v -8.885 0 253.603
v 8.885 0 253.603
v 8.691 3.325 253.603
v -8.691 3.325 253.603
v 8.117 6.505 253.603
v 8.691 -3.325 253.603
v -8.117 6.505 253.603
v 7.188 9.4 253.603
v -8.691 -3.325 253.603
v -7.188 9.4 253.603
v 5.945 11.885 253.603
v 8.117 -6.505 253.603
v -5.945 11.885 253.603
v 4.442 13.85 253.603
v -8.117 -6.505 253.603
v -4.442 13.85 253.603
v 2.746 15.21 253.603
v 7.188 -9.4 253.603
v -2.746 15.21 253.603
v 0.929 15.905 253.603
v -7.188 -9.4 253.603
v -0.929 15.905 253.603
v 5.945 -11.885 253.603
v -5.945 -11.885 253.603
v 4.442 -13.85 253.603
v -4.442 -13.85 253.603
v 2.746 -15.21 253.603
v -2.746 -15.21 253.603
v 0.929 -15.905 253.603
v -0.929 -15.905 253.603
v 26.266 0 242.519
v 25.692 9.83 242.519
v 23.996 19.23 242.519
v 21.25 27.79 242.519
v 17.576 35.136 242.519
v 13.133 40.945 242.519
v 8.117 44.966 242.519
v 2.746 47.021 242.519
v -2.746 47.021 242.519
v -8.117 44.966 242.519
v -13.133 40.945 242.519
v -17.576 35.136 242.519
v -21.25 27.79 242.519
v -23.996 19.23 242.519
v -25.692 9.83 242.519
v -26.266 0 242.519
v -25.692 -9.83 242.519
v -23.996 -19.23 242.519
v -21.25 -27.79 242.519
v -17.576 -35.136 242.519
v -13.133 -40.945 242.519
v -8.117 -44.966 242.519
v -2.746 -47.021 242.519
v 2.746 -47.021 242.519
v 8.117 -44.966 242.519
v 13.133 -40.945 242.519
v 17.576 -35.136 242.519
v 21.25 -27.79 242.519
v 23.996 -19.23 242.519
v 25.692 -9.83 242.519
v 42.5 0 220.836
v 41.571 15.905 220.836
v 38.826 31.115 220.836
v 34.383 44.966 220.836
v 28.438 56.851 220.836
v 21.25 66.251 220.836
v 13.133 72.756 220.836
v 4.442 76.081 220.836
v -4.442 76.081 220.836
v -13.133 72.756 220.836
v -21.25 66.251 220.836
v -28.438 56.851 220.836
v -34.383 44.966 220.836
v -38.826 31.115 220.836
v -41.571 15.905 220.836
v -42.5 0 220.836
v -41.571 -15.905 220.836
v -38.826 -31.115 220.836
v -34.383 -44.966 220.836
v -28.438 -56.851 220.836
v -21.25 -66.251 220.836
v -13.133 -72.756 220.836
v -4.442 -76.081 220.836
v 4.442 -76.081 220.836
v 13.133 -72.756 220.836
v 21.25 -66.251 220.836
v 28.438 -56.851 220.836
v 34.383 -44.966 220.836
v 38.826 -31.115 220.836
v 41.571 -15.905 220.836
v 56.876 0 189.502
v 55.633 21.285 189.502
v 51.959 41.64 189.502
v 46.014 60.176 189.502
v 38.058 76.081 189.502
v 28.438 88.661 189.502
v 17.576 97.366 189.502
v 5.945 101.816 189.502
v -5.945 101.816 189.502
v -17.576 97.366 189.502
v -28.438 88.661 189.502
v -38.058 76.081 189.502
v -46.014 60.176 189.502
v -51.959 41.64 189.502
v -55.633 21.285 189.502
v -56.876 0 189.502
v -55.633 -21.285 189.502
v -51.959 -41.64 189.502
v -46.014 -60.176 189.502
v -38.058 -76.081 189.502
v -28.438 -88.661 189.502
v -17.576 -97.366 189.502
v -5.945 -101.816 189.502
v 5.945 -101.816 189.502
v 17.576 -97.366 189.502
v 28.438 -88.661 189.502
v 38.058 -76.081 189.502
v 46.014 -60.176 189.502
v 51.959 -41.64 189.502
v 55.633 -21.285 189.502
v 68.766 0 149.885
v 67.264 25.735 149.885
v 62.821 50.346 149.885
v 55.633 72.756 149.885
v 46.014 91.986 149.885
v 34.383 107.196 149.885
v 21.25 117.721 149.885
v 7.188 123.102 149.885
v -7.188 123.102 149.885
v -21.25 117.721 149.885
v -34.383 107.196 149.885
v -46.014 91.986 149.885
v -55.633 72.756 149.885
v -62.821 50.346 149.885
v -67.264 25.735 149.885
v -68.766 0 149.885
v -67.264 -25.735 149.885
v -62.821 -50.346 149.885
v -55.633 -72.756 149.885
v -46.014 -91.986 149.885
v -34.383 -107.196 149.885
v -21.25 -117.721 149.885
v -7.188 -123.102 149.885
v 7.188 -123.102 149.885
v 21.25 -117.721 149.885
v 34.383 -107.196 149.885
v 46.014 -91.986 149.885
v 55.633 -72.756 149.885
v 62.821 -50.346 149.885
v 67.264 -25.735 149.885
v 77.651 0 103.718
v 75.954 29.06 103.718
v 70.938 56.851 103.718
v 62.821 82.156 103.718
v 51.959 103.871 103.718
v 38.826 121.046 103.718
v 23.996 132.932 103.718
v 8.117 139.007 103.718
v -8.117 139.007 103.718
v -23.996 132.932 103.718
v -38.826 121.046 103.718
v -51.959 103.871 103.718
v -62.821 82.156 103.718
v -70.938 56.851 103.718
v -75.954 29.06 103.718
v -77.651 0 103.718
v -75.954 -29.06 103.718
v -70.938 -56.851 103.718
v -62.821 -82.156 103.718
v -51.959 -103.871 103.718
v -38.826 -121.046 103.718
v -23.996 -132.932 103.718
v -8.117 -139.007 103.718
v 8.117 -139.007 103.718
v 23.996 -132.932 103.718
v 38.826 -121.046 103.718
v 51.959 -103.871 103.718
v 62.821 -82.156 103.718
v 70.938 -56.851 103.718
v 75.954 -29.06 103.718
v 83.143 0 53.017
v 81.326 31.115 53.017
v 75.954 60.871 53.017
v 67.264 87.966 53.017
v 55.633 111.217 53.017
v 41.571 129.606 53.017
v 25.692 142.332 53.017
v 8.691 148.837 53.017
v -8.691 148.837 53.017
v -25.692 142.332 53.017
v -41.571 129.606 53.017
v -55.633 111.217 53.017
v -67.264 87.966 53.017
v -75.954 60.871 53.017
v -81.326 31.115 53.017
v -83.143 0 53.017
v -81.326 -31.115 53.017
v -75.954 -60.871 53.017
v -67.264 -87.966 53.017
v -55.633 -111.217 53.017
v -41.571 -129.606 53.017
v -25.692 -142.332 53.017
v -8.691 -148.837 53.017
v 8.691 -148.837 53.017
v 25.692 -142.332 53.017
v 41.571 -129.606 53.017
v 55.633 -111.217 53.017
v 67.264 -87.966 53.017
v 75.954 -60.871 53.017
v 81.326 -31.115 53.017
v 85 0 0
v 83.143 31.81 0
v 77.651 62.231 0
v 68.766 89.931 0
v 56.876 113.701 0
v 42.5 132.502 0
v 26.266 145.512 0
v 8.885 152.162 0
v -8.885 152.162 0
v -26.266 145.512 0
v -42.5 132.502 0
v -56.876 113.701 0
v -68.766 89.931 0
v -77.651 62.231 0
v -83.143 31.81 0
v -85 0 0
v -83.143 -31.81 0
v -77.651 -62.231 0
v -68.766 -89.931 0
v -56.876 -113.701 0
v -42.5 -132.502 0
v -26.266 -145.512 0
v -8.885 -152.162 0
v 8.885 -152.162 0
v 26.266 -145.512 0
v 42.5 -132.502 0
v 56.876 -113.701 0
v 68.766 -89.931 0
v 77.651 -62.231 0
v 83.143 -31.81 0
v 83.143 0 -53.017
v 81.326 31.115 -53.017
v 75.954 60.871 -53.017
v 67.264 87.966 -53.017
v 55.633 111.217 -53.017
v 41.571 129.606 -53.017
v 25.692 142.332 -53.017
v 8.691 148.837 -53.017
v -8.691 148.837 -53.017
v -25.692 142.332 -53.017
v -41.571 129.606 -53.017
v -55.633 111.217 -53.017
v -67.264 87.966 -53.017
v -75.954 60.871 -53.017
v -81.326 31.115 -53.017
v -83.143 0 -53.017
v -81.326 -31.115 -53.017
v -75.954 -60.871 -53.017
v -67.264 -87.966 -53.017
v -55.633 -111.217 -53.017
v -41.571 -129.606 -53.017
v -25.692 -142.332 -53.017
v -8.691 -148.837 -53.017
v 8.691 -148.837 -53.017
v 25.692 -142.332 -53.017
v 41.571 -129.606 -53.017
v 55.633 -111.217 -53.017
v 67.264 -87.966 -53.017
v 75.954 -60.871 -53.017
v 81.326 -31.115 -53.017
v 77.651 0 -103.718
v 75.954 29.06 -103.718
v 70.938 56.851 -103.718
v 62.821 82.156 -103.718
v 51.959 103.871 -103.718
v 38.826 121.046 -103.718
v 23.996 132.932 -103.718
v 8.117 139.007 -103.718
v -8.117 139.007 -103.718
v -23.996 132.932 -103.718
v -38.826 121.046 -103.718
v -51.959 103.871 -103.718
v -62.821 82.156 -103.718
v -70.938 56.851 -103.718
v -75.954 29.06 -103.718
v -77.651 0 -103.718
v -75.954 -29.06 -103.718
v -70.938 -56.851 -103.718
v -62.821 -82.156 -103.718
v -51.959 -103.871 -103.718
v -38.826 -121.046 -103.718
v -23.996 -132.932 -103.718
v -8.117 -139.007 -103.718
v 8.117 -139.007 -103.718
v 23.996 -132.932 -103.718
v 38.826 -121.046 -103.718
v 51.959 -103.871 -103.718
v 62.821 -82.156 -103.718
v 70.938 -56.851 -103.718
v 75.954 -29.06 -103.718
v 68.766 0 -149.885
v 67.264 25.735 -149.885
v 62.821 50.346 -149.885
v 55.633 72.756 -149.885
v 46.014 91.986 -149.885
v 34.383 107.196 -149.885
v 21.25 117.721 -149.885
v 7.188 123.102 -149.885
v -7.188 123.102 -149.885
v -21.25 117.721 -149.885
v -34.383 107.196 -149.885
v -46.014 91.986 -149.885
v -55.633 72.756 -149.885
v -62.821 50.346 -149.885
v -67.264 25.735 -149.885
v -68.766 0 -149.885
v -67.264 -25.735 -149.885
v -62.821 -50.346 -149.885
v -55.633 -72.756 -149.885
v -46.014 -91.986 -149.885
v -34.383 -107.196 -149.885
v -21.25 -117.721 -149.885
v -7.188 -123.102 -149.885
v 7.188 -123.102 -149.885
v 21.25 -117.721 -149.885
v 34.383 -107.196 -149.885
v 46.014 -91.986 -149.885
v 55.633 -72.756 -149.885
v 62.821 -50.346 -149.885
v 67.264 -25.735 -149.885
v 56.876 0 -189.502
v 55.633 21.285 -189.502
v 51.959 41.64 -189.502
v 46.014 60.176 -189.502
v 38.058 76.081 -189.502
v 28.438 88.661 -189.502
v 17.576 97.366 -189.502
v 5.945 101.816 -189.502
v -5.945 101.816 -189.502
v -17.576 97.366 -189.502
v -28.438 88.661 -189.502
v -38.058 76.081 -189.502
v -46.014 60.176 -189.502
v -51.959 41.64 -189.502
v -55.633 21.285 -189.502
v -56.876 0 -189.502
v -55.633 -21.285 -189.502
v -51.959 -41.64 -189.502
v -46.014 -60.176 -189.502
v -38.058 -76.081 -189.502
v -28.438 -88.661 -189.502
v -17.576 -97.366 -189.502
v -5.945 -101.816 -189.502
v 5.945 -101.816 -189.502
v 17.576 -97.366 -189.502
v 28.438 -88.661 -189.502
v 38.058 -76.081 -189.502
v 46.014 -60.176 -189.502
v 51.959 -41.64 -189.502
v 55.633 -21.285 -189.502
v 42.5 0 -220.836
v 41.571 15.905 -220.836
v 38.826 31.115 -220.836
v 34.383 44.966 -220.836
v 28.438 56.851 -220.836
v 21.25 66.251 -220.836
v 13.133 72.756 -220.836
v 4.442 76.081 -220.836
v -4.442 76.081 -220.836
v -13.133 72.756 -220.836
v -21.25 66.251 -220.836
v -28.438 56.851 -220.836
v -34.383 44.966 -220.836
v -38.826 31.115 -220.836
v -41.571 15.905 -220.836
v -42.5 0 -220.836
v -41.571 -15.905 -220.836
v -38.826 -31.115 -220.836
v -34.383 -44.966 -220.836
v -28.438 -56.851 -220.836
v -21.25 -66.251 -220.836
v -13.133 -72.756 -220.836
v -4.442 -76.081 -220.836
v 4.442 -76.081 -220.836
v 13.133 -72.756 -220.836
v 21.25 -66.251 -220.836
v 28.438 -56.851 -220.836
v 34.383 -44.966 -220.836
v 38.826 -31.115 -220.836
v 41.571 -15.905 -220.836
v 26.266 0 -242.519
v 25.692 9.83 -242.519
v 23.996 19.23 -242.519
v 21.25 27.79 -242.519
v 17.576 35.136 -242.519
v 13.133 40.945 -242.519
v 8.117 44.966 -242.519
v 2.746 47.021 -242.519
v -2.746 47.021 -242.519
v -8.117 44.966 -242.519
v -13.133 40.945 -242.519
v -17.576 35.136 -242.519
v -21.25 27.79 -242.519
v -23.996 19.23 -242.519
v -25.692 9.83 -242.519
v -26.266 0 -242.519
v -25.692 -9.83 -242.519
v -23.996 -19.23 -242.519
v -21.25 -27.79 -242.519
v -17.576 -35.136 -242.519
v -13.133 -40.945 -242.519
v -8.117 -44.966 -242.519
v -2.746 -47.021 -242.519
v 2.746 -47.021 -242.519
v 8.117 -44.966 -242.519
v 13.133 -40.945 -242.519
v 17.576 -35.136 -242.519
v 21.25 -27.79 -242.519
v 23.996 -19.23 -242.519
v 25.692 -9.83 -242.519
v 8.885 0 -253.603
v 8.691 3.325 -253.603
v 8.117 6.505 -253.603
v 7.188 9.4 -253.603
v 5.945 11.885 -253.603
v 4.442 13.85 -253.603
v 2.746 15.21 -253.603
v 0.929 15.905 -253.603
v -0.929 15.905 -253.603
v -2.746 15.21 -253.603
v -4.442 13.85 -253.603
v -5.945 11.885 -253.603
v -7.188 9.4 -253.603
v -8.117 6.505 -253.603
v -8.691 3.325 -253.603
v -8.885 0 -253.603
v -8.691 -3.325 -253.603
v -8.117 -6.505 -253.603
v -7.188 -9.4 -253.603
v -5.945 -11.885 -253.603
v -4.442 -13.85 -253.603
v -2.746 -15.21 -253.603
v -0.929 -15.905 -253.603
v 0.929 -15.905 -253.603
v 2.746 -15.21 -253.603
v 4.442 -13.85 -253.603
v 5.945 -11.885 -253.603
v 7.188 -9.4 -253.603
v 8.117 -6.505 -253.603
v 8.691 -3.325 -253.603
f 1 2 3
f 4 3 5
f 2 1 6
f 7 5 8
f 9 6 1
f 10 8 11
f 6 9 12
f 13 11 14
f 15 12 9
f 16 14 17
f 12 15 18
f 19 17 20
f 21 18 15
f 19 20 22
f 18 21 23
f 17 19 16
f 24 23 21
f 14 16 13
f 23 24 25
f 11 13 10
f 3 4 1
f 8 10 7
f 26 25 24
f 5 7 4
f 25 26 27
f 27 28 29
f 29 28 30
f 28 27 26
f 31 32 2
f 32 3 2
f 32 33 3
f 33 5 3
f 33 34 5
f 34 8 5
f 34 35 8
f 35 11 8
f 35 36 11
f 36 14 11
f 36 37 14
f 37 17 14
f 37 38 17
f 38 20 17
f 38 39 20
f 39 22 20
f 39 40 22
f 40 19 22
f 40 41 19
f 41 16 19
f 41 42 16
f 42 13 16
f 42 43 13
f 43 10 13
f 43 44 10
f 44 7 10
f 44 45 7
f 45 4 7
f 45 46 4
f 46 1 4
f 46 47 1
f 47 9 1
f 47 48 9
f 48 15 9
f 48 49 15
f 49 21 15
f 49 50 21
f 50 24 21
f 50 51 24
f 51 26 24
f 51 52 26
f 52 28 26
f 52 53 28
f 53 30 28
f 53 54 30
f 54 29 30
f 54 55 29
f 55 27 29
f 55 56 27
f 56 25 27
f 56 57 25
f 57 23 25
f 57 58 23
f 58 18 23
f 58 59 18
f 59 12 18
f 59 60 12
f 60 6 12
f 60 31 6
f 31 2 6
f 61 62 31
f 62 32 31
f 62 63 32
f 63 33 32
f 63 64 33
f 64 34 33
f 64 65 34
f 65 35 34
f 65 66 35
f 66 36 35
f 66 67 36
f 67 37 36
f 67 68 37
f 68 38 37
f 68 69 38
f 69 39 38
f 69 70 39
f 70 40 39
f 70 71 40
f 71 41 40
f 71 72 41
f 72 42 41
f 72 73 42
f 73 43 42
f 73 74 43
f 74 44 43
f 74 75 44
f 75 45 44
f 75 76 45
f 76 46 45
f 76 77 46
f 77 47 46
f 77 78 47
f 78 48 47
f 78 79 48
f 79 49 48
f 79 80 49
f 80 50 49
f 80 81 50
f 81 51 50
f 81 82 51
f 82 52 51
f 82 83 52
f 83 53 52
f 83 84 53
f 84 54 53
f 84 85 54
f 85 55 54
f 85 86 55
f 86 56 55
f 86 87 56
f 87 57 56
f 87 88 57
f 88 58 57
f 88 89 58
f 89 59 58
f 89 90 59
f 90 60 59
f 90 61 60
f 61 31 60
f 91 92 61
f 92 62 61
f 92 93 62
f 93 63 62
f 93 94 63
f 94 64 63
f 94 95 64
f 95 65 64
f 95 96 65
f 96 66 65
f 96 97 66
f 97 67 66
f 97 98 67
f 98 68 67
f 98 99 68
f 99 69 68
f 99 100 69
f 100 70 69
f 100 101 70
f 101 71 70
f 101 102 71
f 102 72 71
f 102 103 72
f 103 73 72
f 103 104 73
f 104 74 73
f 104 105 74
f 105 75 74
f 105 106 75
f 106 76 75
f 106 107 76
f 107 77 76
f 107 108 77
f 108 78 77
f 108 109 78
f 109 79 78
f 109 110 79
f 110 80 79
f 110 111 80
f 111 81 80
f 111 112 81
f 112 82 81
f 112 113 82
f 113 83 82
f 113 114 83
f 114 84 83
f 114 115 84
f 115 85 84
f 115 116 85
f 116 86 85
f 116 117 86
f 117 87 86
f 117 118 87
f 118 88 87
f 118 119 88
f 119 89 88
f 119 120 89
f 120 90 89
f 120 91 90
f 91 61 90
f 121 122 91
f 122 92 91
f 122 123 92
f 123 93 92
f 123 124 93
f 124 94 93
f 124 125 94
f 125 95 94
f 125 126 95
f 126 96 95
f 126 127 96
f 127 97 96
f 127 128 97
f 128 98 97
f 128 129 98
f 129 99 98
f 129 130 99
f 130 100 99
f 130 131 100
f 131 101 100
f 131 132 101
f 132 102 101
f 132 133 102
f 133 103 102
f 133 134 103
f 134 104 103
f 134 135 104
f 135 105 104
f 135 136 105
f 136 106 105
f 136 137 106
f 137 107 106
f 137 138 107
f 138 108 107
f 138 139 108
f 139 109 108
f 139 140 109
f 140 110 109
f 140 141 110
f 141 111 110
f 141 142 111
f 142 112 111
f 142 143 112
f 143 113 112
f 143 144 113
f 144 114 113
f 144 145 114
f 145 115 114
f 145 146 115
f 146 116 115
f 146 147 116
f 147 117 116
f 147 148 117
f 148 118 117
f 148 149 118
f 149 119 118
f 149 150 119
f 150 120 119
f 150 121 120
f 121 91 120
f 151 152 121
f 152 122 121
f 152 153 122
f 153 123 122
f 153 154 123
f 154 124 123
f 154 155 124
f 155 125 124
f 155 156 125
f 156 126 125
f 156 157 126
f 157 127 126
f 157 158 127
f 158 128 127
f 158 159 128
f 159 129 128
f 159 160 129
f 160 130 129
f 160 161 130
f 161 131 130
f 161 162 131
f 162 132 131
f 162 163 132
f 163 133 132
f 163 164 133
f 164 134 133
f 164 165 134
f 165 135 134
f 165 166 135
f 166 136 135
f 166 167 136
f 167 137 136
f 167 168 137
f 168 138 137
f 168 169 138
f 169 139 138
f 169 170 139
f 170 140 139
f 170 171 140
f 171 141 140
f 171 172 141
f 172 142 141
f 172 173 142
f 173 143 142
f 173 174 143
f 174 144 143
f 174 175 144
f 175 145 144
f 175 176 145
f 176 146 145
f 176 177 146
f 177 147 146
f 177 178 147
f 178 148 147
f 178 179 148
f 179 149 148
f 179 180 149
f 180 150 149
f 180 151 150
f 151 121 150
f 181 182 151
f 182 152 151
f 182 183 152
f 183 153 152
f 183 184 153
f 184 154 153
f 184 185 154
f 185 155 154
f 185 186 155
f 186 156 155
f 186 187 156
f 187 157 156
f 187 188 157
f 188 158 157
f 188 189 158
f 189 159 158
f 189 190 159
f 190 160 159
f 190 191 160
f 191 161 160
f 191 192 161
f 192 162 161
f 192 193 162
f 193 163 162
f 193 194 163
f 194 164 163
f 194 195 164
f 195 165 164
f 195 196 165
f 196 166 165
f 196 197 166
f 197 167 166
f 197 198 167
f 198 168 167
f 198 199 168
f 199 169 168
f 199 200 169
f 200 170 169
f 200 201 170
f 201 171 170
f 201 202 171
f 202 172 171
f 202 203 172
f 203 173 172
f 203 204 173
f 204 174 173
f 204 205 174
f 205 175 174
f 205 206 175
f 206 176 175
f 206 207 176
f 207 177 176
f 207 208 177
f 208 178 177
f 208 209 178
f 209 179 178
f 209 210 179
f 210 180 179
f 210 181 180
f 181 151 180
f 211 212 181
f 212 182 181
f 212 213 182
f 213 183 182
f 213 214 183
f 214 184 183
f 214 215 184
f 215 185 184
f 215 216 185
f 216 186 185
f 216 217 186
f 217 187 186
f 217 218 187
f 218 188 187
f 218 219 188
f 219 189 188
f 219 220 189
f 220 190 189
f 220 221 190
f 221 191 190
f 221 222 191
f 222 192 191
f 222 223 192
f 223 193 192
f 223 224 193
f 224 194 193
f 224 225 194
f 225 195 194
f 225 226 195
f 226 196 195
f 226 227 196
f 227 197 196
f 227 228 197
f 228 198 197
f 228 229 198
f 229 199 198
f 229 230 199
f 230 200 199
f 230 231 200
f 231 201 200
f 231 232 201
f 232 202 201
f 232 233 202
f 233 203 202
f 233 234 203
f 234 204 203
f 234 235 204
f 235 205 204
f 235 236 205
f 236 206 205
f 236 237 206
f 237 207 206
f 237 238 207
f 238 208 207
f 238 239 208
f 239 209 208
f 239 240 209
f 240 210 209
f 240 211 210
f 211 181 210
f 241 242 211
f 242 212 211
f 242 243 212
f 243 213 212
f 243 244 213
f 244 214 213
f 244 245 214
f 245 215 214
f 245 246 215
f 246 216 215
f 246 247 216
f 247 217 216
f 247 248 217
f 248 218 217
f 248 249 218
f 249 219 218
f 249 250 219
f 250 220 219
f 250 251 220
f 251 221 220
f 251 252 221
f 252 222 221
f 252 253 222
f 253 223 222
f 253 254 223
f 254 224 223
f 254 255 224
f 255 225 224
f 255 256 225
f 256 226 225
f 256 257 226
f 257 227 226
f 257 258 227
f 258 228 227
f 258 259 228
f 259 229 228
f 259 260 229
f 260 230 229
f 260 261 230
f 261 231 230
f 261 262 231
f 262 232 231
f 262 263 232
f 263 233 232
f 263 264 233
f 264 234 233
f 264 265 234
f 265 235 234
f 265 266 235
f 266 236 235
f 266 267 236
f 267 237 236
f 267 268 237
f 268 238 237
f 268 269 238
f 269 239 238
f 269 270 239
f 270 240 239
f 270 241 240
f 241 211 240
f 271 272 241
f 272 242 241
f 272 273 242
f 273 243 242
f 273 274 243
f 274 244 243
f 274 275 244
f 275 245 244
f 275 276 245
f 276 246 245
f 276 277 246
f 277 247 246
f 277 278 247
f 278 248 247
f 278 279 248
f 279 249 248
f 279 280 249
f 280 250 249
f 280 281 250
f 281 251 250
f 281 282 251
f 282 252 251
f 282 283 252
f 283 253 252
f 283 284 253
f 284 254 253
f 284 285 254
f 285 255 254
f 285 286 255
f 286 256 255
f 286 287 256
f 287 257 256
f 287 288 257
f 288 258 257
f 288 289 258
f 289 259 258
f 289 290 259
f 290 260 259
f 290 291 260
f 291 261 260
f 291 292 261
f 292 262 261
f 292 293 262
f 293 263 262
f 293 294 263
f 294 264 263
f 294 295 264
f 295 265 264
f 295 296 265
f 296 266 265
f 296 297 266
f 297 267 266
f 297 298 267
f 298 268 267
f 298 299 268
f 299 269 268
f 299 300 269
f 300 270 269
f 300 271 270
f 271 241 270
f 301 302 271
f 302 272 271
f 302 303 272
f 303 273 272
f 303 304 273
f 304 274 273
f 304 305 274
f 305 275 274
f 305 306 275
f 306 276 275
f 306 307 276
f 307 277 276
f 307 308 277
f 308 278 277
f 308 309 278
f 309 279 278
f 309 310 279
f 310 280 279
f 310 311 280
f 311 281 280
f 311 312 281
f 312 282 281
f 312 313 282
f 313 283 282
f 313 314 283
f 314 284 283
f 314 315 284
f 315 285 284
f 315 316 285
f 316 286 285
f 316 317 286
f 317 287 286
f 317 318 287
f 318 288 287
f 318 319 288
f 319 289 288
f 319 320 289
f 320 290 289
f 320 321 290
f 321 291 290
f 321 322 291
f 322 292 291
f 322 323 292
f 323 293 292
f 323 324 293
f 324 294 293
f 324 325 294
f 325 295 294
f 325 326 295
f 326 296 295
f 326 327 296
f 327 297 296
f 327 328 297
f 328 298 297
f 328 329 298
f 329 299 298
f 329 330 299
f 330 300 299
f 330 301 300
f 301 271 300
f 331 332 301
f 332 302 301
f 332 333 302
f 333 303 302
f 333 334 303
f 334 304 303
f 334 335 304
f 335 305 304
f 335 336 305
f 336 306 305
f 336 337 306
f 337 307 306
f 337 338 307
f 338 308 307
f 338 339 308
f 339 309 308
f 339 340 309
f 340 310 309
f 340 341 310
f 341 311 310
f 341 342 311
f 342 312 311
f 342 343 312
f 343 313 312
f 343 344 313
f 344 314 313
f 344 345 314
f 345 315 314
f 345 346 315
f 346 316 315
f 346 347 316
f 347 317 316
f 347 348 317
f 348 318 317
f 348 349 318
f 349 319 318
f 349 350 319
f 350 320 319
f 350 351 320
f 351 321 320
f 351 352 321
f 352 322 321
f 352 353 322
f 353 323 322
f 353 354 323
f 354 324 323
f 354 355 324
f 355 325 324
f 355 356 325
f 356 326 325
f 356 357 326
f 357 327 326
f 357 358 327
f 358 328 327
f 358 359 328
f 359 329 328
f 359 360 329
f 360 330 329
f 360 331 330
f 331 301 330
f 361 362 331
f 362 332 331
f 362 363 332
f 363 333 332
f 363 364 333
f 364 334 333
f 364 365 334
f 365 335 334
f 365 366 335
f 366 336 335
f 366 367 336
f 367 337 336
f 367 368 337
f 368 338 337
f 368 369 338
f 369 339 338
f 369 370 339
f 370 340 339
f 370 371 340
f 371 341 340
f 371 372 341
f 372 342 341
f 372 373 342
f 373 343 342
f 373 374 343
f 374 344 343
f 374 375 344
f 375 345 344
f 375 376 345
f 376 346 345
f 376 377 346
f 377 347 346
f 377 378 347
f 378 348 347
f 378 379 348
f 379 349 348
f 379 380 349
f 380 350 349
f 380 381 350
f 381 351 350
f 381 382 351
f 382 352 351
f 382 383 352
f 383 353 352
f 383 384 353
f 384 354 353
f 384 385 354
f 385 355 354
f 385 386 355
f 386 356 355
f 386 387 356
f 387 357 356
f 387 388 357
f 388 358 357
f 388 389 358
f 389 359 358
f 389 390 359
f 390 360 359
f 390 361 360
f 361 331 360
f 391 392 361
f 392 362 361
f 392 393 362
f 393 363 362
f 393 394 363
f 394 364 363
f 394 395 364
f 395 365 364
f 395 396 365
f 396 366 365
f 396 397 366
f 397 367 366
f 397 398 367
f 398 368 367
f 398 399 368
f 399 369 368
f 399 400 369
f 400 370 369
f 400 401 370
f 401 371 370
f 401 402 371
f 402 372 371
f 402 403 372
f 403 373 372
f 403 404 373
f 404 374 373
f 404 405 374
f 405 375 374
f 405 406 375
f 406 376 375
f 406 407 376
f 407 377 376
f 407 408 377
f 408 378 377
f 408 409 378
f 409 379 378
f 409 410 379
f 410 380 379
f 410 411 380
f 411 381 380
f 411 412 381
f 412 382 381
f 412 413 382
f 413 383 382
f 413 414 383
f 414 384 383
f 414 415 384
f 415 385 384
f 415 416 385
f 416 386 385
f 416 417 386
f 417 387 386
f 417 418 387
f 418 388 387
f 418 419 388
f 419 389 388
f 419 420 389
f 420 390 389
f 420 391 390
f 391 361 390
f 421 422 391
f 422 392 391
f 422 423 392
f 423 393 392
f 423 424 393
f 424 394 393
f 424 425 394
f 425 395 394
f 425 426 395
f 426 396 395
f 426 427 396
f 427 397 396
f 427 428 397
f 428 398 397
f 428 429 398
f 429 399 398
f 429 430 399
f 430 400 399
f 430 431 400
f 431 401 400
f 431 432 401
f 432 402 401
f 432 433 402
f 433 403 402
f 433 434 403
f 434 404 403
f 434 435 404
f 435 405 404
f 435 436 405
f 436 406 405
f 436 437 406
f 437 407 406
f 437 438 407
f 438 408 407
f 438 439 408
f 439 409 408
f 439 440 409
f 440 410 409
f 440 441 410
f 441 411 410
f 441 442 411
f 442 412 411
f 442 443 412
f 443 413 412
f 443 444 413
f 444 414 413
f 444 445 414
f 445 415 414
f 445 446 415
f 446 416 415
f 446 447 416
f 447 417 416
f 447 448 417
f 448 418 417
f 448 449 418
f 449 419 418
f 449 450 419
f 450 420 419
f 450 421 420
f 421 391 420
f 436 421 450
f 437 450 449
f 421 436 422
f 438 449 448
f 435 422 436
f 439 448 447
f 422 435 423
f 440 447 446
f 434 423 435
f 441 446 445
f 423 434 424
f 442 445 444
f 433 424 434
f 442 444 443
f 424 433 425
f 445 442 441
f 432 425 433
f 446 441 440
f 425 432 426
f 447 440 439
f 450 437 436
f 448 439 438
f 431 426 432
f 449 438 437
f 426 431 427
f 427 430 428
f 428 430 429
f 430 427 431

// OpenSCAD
// Generated by SolidPython 1.0.1 on 2020-07-29 00:46:46


scale(v = [5, 9, 15]) {
	sphere(r = 17);
}
/***********************************************
*********      SolidPython code:      **********
************************************************
 
# import packages: SolidPython
from solid import *
from solid.utils import *
from itertools import chain, combinations, permutations


class Resize:

    def __init__(self, scad_file):
        self.scad_file = scad_file
        #self.scad_file = import_scad(scad_file)
        # cone/cylinder param:
        self.r1 = 0
        self.r2 = 0
        self.h = 0
        # rectangular prism param:
        self.w = 0
        self.l = 0
        # ellipse param:
        self.r = 0

    # import OpenScad code (file name corresponds to shape)


    # classify shape + parameters
    def assign(self, param1, param2, param3):
        if self.scad_file == 'cone.scad':
            self.r1 = param1
            self.r2 = param2
            self.h = param3
        elif self.scad_file == 'cylinder.scad':
            self.r1 = param1
            self.r2 = param2
            self.h = param3
        elif self.scad_file == 'rectangularPrism.scad':
            self.h = param1
            self.l = param2
            self.w = param3
        else:
            self.r = param1
            self.h = param2

    # resize parameters
    def iterate(self):
        x = range(3, 20, 2)
        i = 1
        if self.scad_file == 'cone.scad':
            tempList = list(permutations(x, 2))
            for temp in tempList:
                param1 = temp[0]
                param2 = temp[1]
                filepath = 'produced_scad_files/' + 'cone' + str(param1) + '_' + str(param2) + '_' + '.scad'
                scad_render_to_file(cylinder(h=param1, r1=param2, r2=0), filepath)

        elif self.scad_file == 'cylinder.scad':
            tempList = list(permutations(x, 3))
            for temp in tempList:
                param1 = temp[0]
                param2 = temp[1]
                filepath = 'produced_scad_files/' + 'cylinder' + str(param1) + '_' + str(param2) + '_' + '.scad'
                scad_render_to_file(cylinder(h=param1, r1=param2, r2=param2), filepath)

        elif self.scad_file == 'rectangularPrism.scad':
            tempList = list(permutations(x, 3))
            for temp in tempList:
                param1 = temp[0]
                param2 = temp[1]
                param3 = temp[2]
                filepath = 'produced_scad_files/' + 'rectangularPrism' + str(param1) + '_' + str(param2) + '_' + str(
                    param3) + '.scad'
                scad_render_to_file(cube(size=(param1, param2, param3)), filepath)

        elif self.scad_file == 'ellipse.scad':
            tempList = list(permutations(x, 4))
            for temp in tempList:
                param1 = temp[0]
                param2 = temp[1]
                param3 = temp[2]
                param4 = temp[3]
                filepath = 'produced_scad_files/' + 'ellipse' + str(param1) + '_' + str(param2) + '_' + str(param3) + '_' + str(param4) + '.scad'
                scad_render_to_file(scale([param1, param2, param3])(sphere(r=param4)), filepath)

    def render_to_scadfile(self):
        scad_render_to_file(scad, 'example.scad') 
 
************************************************/
